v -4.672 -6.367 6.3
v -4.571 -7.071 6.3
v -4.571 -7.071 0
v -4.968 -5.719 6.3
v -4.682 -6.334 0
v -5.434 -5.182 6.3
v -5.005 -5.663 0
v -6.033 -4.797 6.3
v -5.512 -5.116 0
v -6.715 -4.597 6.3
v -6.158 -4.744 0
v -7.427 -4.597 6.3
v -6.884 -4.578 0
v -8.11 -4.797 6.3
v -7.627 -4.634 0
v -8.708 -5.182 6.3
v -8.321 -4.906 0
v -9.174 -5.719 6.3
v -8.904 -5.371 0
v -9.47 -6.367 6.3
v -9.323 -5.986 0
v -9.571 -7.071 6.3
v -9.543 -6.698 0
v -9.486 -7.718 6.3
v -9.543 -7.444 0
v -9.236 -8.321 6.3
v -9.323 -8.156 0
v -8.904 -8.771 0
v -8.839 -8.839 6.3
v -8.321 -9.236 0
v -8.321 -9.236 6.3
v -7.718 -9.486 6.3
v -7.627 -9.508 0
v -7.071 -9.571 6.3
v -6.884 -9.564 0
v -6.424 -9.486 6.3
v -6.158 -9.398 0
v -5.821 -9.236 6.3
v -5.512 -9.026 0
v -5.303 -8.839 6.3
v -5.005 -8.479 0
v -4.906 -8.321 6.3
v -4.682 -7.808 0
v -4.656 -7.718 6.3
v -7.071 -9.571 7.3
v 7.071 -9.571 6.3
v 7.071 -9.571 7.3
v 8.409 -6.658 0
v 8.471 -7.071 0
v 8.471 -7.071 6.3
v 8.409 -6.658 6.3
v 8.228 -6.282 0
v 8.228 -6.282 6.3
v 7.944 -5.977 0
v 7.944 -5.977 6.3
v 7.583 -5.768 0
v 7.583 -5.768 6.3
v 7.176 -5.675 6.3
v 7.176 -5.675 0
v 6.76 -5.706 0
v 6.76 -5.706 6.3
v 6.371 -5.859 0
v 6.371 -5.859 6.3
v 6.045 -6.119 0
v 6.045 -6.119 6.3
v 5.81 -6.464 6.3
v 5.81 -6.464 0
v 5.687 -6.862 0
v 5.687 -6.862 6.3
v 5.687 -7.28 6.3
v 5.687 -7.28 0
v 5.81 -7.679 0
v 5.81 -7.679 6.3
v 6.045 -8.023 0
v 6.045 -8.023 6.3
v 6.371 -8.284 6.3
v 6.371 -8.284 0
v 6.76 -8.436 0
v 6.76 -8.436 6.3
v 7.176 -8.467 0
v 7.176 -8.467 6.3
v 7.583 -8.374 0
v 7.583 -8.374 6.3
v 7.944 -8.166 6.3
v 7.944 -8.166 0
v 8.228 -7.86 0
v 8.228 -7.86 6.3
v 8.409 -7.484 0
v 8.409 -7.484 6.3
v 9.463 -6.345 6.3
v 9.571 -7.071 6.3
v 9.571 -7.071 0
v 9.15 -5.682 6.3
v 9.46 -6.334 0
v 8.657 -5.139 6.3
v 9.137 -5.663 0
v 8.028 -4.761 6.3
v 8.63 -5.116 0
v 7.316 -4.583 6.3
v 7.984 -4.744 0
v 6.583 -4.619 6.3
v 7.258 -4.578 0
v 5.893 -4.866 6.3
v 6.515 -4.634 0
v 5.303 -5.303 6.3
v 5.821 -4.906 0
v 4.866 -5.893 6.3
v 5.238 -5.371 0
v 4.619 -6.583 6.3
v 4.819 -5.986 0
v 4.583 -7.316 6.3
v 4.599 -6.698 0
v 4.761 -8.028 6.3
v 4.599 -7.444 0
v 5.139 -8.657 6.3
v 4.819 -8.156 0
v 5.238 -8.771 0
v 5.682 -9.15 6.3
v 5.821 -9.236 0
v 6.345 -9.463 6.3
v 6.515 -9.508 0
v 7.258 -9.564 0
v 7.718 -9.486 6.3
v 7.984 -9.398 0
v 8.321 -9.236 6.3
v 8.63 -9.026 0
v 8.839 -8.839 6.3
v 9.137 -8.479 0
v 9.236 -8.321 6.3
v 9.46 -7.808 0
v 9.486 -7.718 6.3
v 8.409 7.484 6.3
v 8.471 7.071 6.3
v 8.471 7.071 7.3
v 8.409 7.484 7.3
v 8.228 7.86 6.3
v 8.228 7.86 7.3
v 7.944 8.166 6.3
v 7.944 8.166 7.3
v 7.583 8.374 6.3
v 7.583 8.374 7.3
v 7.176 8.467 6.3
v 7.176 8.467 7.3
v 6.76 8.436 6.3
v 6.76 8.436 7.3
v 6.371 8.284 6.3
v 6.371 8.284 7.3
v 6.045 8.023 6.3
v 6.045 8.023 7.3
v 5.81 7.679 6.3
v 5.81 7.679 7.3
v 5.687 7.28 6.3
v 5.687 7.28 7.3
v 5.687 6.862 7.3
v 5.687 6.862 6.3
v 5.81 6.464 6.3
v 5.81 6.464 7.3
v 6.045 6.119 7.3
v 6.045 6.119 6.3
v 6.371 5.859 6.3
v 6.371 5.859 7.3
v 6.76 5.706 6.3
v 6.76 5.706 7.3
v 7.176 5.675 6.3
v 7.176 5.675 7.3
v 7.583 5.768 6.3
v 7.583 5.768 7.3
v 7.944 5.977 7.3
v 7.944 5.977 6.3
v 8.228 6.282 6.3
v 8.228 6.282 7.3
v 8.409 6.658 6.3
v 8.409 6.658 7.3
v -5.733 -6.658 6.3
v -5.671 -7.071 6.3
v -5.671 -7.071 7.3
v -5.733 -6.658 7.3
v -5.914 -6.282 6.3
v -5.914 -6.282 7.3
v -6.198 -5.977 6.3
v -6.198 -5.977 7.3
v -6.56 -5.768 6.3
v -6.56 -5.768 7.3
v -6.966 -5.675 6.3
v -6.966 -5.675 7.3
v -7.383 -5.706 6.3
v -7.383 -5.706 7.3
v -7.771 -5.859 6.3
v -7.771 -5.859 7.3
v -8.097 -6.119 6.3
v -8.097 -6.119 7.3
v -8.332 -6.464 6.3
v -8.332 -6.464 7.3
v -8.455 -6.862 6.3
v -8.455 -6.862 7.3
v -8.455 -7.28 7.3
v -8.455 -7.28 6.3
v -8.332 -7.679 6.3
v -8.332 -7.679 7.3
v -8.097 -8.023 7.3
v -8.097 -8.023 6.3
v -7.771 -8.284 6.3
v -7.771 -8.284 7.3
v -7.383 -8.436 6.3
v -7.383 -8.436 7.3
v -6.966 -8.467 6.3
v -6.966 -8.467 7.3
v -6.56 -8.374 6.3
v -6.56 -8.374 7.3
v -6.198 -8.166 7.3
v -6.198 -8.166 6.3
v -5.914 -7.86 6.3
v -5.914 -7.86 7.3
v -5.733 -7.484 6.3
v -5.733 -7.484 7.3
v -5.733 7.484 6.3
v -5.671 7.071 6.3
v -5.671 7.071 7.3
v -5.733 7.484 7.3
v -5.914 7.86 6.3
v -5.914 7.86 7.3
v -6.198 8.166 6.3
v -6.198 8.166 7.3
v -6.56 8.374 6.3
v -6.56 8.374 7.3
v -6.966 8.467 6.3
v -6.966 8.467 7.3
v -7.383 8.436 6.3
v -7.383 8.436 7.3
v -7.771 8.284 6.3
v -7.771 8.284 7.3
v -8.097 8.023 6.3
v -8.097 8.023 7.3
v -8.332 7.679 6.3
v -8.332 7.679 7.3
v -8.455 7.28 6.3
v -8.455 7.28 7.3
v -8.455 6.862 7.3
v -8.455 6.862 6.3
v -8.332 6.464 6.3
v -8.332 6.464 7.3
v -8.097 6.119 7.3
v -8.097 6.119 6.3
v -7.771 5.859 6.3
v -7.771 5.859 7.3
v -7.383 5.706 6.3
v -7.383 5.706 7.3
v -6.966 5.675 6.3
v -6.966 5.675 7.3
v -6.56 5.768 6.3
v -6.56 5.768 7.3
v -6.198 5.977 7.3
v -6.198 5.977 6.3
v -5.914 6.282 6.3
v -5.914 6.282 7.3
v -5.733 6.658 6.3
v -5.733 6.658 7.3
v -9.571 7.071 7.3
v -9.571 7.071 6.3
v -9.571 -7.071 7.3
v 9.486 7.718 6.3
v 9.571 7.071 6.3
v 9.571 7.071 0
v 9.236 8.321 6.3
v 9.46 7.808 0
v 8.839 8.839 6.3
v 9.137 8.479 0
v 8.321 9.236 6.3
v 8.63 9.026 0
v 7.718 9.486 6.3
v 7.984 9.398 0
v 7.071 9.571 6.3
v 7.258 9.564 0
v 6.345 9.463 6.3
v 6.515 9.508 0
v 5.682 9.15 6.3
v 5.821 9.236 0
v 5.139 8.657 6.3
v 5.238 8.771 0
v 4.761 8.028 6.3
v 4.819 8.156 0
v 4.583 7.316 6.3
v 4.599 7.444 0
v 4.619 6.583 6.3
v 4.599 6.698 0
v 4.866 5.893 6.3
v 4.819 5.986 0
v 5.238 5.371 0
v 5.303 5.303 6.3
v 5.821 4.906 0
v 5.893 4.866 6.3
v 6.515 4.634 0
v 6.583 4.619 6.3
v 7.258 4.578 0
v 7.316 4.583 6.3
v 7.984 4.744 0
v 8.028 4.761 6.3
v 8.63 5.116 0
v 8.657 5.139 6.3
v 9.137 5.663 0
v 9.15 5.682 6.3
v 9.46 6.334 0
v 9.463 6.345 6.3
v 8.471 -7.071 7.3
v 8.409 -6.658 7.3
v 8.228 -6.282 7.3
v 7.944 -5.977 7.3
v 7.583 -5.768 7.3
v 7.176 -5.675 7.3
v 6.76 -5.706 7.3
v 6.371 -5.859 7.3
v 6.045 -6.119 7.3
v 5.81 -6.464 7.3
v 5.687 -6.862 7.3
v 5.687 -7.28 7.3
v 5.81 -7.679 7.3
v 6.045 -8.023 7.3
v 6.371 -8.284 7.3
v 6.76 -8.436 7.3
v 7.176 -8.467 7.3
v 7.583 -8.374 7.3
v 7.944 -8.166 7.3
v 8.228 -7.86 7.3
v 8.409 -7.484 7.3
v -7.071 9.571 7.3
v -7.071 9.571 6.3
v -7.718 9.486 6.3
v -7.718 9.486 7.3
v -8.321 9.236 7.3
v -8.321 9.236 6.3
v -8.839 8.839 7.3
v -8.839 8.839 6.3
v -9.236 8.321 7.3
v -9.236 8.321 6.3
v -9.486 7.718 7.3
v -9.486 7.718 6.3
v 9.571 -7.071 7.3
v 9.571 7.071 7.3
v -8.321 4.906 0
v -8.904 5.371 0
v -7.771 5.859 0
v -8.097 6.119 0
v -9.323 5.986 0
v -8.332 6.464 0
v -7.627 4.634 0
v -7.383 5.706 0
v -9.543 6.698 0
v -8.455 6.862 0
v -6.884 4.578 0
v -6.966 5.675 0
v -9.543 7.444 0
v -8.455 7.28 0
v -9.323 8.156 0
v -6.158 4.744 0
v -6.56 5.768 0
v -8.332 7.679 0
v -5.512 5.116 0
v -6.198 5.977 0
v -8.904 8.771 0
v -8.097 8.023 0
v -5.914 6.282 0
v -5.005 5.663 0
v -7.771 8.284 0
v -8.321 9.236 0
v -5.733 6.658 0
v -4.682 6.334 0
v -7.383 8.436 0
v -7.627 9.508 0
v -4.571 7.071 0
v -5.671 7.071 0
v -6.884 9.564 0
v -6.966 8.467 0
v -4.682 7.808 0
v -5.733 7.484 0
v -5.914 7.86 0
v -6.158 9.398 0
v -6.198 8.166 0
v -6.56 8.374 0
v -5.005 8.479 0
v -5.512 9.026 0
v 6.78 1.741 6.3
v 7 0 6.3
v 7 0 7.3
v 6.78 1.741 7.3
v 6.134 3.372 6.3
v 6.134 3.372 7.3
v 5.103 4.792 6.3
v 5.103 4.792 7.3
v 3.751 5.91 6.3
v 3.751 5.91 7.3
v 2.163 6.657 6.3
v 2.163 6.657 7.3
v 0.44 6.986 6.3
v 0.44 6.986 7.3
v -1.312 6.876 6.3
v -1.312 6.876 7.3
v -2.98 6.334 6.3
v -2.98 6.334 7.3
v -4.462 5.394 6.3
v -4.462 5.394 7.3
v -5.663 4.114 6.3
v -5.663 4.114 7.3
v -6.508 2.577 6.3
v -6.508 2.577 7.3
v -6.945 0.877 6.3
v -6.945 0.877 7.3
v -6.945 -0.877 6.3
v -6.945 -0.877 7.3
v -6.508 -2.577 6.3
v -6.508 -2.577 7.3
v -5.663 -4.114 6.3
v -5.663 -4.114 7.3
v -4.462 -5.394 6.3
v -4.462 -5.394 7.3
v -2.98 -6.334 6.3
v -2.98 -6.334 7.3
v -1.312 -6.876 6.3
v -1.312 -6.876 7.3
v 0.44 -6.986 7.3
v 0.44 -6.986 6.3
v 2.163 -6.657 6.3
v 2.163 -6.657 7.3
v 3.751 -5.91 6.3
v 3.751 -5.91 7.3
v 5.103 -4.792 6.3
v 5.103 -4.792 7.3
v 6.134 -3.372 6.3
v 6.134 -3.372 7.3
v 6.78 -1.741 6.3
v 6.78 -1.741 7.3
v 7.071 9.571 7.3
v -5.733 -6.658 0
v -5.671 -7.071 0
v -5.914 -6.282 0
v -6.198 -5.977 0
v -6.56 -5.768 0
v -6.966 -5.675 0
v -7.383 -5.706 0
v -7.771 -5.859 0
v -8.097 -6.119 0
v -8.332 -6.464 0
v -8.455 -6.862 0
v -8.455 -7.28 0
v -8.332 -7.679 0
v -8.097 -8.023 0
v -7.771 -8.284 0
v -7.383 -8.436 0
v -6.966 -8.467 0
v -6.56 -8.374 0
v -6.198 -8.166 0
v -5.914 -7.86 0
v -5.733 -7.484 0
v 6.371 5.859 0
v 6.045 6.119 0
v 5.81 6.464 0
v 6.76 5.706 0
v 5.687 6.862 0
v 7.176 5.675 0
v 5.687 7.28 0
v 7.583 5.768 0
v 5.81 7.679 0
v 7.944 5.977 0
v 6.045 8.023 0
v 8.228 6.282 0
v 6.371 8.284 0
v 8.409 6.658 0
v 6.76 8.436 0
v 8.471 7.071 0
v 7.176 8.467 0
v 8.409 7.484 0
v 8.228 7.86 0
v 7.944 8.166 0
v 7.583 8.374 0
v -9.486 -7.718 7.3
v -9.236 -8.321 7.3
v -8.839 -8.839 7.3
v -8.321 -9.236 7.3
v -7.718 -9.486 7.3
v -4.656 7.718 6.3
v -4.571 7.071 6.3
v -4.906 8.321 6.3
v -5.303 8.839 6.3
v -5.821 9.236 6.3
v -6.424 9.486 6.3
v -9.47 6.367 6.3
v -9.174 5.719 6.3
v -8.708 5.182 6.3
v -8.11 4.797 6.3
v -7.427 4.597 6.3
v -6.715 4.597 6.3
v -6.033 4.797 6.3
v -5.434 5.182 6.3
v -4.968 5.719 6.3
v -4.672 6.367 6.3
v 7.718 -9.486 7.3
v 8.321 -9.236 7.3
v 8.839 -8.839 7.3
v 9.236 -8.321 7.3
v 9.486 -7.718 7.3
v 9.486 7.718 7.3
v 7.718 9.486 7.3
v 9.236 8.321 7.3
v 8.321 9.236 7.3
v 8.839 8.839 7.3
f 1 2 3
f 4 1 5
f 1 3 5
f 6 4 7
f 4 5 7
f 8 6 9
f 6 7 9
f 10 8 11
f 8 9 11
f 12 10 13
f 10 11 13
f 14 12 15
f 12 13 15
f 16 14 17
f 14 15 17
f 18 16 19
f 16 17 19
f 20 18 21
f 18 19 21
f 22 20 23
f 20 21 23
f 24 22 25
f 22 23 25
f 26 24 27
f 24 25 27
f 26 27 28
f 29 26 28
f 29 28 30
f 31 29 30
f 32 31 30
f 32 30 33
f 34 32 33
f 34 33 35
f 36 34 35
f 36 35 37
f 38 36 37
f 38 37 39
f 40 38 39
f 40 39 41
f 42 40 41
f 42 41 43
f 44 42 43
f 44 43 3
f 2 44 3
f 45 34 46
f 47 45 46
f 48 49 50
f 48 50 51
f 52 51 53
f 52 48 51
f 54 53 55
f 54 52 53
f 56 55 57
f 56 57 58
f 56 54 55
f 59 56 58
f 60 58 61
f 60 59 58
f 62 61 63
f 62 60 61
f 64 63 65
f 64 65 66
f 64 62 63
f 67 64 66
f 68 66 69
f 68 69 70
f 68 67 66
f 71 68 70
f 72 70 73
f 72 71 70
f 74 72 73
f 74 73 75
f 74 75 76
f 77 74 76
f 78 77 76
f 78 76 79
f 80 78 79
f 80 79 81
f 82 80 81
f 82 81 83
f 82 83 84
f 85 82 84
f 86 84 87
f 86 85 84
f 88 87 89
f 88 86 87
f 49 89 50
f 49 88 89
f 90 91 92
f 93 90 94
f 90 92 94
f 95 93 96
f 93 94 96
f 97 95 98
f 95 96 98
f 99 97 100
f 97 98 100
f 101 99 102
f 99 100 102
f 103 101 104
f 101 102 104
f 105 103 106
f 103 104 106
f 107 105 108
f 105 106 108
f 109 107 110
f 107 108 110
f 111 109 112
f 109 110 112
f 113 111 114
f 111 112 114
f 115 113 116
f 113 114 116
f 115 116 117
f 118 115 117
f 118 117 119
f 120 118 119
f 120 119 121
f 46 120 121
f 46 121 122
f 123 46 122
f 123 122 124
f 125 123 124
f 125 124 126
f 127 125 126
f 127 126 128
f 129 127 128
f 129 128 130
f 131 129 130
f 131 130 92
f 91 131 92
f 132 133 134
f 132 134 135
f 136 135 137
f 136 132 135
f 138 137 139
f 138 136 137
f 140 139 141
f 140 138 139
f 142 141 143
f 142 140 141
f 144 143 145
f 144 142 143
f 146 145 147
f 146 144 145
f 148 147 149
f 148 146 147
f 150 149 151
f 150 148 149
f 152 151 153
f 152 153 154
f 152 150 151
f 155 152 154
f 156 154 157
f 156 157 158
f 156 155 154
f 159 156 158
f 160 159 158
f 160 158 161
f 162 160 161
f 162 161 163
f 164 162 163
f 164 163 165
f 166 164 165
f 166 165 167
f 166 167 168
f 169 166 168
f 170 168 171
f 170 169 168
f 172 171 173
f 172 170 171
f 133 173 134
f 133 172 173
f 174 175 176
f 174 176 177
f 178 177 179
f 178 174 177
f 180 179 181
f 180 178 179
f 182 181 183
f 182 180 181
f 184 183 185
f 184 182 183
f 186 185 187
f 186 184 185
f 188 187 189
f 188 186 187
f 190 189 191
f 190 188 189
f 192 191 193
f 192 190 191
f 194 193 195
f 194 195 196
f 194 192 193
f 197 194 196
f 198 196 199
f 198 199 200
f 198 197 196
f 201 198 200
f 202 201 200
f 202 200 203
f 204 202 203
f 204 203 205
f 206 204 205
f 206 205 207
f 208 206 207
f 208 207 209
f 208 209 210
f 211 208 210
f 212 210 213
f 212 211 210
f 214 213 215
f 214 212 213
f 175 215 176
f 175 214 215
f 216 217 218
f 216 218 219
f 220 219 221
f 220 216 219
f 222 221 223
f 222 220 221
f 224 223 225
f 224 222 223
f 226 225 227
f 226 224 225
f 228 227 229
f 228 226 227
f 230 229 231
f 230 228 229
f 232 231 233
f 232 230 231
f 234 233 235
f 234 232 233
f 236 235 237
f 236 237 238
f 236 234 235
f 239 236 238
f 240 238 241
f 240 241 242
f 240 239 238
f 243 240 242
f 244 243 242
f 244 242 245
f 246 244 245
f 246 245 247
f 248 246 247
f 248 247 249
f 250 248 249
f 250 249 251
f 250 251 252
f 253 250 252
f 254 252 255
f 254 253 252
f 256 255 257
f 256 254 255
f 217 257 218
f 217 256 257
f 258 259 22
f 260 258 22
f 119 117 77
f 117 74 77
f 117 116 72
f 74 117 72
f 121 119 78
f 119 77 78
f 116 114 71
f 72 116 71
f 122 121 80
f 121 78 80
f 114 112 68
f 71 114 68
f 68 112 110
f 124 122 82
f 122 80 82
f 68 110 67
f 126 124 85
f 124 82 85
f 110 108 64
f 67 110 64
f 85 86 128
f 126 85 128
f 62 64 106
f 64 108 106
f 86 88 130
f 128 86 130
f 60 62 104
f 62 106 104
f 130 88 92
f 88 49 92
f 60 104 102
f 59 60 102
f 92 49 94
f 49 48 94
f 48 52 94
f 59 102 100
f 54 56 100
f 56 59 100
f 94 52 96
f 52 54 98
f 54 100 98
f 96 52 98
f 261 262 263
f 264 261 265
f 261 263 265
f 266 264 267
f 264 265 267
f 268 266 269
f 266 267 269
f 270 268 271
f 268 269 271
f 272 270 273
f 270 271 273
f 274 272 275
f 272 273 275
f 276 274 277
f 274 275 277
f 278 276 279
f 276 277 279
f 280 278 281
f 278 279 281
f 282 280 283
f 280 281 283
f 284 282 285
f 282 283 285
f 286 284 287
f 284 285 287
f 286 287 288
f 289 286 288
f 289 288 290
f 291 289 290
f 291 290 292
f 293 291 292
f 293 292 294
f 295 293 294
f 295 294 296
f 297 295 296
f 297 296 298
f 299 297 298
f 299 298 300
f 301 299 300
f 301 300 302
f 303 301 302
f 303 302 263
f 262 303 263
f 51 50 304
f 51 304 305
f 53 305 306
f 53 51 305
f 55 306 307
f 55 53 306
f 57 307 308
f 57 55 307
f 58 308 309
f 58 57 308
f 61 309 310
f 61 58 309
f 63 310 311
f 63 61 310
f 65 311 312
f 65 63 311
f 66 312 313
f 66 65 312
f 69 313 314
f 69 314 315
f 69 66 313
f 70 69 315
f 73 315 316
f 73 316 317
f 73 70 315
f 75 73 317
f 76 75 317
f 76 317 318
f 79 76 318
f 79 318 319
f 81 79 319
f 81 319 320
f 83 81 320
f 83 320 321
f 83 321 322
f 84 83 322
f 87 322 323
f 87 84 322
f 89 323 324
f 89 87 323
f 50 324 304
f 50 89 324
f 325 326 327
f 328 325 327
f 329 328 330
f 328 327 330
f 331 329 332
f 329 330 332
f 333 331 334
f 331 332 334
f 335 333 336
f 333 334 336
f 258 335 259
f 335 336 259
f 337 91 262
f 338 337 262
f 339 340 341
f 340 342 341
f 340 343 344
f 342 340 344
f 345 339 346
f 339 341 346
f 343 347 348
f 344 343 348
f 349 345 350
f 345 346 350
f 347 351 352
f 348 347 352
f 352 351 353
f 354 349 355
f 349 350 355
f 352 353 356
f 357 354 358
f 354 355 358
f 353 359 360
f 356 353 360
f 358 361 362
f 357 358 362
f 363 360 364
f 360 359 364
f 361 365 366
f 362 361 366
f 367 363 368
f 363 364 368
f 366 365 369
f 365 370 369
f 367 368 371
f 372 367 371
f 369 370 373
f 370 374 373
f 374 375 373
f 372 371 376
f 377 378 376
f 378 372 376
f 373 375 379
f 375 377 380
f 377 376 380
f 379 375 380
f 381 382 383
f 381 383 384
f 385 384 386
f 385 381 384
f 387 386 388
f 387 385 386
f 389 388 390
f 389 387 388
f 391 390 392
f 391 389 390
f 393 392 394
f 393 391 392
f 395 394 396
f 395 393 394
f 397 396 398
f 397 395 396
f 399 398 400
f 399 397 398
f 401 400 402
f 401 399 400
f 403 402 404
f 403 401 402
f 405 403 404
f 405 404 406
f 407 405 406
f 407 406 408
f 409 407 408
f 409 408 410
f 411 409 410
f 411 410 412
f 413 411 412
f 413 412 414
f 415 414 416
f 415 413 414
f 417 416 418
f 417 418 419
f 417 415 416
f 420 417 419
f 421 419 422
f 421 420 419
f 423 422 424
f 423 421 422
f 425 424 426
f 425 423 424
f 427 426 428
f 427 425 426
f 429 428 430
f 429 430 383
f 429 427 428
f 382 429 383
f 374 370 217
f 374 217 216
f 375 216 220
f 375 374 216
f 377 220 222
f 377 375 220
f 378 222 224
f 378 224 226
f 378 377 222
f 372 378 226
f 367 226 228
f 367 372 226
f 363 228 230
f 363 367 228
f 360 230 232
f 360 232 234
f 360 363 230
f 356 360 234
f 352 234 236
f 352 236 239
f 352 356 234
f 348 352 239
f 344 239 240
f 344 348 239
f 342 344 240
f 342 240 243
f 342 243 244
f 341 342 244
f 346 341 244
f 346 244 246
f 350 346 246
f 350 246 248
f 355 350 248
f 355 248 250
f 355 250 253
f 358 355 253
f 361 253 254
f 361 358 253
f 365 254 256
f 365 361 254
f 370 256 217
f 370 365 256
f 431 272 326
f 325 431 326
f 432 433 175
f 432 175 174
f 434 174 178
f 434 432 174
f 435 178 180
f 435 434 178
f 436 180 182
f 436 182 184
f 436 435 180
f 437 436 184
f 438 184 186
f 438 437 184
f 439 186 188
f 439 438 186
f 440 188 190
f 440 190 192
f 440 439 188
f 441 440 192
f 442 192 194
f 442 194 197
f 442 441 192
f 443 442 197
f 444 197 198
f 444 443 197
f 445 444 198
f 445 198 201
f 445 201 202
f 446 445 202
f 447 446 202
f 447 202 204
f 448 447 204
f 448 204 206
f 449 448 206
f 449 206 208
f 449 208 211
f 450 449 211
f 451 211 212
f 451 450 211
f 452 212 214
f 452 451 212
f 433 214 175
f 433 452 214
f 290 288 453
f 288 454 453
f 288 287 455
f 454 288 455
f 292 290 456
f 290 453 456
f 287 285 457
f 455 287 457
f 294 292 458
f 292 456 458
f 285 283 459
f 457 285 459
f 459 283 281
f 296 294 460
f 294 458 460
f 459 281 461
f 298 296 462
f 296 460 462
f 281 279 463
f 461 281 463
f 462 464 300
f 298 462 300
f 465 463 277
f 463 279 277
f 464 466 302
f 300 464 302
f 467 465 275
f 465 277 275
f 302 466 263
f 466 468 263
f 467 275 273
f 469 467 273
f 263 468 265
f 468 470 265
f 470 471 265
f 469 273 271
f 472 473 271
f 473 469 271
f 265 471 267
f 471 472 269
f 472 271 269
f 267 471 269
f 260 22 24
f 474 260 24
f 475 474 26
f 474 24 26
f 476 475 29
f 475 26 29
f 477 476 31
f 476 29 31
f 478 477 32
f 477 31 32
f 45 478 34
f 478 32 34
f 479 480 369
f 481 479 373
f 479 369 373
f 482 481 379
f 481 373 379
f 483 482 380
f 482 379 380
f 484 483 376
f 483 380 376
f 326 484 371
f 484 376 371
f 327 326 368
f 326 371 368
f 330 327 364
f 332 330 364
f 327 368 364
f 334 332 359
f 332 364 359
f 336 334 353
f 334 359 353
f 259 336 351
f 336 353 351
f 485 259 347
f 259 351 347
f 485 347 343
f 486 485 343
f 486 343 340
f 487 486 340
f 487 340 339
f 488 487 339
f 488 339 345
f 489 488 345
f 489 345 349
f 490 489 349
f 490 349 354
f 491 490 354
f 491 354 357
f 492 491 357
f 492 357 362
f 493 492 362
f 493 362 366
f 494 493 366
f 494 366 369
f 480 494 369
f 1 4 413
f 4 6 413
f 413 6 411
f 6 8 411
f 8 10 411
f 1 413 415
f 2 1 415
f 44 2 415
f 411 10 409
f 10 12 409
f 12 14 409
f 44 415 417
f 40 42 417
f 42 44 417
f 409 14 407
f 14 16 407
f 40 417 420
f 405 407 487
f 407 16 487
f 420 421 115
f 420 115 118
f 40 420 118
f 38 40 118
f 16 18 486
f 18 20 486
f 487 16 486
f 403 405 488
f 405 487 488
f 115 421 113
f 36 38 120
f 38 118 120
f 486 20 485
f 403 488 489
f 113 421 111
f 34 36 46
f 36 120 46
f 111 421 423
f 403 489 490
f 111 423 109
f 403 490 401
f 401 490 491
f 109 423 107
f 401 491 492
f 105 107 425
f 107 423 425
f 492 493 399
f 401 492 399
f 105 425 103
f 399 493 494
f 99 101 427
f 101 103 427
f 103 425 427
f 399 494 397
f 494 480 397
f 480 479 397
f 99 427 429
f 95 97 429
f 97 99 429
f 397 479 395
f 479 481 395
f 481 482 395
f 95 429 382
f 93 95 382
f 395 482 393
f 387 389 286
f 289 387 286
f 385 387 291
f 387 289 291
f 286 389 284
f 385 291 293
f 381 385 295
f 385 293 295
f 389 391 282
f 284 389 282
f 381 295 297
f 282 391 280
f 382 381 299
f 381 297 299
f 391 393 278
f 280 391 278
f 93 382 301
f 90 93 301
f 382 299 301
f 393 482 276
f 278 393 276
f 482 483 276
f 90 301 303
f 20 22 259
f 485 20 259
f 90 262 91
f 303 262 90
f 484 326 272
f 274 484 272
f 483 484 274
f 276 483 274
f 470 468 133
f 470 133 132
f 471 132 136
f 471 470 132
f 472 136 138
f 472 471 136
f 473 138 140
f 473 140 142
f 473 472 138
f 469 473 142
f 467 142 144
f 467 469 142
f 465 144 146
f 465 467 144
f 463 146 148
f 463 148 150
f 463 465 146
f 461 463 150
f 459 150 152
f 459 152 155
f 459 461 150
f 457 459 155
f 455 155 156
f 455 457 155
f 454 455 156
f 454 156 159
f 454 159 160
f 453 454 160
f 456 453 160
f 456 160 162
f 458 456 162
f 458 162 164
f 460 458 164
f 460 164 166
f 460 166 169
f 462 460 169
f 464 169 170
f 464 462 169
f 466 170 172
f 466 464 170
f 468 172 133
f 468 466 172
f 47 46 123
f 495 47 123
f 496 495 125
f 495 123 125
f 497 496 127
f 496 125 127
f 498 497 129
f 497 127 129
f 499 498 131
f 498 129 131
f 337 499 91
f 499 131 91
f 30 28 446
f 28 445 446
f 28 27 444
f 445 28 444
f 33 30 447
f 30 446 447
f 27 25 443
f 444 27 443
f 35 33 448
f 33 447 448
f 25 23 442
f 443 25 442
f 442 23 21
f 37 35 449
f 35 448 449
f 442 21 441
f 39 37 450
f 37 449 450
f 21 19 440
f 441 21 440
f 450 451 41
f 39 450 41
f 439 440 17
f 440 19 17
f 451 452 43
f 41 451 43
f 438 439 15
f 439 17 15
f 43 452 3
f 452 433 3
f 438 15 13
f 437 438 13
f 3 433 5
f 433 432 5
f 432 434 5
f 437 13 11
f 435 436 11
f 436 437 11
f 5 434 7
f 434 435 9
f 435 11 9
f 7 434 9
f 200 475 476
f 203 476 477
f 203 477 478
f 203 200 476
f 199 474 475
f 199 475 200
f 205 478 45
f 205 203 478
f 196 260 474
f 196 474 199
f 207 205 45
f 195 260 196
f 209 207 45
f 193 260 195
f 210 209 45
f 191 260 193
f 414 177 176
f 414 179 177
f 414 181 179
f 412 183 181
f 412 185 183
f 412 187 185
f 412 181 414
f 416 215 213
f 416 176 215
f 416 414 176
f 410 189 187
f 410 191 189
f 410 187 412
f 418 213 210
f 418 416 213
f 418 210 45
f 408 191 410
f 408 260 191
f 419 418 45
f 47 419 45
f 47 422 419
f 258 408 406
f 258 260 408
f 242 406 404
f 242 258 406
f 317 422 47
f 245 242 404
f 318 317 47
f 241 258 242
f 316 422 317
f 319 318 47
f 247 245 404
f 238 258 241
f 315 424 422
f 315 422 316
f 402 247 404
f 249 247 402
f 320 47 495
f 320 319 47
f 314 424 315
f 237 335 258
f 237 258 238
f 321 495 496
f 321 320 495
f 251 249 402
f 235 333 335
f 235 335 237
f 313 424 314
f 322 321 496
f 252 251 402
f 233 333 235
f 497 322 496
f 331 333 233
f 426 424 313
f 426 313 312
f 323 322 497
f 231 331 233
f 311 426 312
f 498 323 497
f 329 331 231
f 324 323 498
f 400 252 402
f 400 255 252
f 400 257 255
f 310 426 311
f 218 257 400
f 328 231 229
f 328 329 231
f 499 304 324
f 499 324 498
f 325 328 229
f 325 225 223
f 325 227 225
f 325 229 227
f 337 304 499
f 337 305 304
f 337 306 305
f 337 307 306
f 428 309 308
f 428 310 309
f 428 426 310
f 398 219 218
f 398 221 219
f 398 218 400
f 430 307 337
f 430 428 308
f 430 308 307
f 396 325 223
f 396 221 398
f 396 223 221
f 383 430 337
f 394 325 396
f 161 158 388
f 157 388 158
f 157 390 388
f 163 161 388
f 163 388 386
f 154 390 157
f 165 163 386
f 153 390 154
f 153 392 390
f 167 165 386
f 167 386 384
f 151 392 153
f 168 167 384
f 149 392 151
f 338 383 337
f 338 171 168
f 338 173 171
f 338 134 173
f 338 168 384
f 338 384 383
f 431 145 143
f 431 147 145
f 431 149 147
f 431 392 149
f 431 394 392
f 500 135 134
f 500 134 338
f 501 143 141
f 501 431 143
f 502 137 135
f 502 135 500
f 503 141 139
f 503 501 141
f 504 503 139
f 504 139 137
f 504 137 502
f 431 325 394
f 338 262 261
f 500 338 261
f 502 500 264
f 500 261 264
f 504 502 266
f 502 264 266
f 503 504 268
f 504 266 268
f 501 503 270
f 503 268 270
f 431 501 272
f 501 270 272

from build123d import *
from build123d.topology import SkipClean

# Parameters (mm, degrees)
SKETCH1_R             = 2.5
SKETCH1_R_2           = 1.4
BOSS_EXTRUDE1_DEPTH   = 6.3
BOSS_EXTRUDE1_2_DEPTH = 6.3
BOSS_EXTRUDE1_3_DEPTH = 6.3
BOSS_EXTRUDE1_4_DEPTH = 6.3
SKETCH2_R             = 1.4
SKETCH2_R_2           = 7
BOSS_EXTRUDE2_DEPTH   = 1


with BuildPart() as part:
    # Sketch1 → Boss-Extrude1 (new body)
    with BuildSketch(Plane.XY):
        with Locations((-7.071067812, 7.071067812)):
            Circle(SKETCH1_R)
        with Locations((-7.071067812, 7.071067812)):
            Circle(SKETCH1_R_2, mode=Mode.SUBTRACT)
    extrude(amount=BOSS_EXTRUDE1_DEPTH)



with BuildPart() as body_2:
    # Sketch1 → Boss-Extrude1 2 (new body)
    with BuildSketch(Plane.XY):
        with Locations((7.071067812, 7.071067812)):
            Circle(SKETCH1_R)
        with Locations((7.071067812, 7.071067812)):
            Circle(SKETCH1_R_2, mode=Mode.SUBTRACT)
    extrude(amount=BOSS_EXTRUDE1_2_DEPTH)


with BuildPart() as body_3:
    # Sketch1 → Boss-Extrude1 3 (new body)
    with BuildSketch(Plane.XY):
        with Locations((7.071067812, -7.071067812)):
            Circle(SKETCH1_R)
        with Locations((7.071067812, -7.071067812)):
            Circle(SKETCH1_R_2, mode=Mode.SUBTRACT)
    extrude(amount=BOSS_EXTRUDE1_3_DEPTH)


with BuildPart() as body_4:
    # Sketch1 → Boss-Extrude1 4 (new body)
    with BuildSketch(Plane.XY):
        with Locations((-7.071067812, -7.071067812)):
            Circle(SKETCH1_R)
        with Locations((-7.071067812, -7.071067812)):
            Circle(SKETCH1_R_2, mode=Mode.SUBTRACT)
    extrude(amount=BOSS_EXTRUDE1_4_DEPTH)


with BuildPart() as part_1:
    with SkipClean():  # the faces are left unmerged after this step: merging them gives an invalid solid
        add(part.part)

        add(body_2.part)  # Boss-Extrude2 merges body 2

        add(body_3.part)  # Boss-Extrude2 merges body 3

        add(body_4.part)  # Boss-Extrude2 merges body 4
        # Sketch2 → Boss-Extrude2 (add)
        with BuildSketch(Plane.XY.offset(6.3)):
            with BuildLine():
                Line((-9.571067812, 7.071067812), (-9.571067812, -7.071067812))
                ThreePointArc((-9.571067812, -7.071067812), (-8.838834765, -8.838834765), (-7.071067812, -9.571067812))
                Line((-7.071067812, -9.571067812), (7.071067812, -9.571067812))
                ThreePointArc((7.071067812, -9.571067812), (8.838834765, -8.838834765), (9.571067812, -7.071067812))
                Line((9.571067812, -7.071067812), (9.571067812, 7.071067812))
                ThreePointArc((9.571067812, 7.071067812), (8.838834765, 8.838834765), (7.071067812, 9.571067812))
                Line((7.071067812, 9.571067812), (-7.071067812, 9.571067812))
                ThreePointArc((-7.071067812, 9.571067812), (-8.838834765, 8.838834765), (-9.571067812, 7.071067812))
            make_face()
            with Locations((7.071067812, -7.071067812)):
                Circle(SKETCH2_R, mode=Mode.SUBTRACT)
            with Locations((7.071067812, 7.071067812)):
                Circle(SKETCH2_R, mode=Mode.SUBTRACT)
            with Locations((-7.071067812, -7.071067812)):
                Circle(SKETCH2_R, mode=Mode.SUBTRACT)
            with Locations((-7.071067812, 7.071067812)):
                Circle(SKETCH2_R, mode=Mode.SUBTRACT)
            Circle(SKETCH2_R_2, mode=Mode.SUBTRACT)
        extrude(amount=BOSS_EXTRUDE2_DEPTH)


solid = part_1.part
